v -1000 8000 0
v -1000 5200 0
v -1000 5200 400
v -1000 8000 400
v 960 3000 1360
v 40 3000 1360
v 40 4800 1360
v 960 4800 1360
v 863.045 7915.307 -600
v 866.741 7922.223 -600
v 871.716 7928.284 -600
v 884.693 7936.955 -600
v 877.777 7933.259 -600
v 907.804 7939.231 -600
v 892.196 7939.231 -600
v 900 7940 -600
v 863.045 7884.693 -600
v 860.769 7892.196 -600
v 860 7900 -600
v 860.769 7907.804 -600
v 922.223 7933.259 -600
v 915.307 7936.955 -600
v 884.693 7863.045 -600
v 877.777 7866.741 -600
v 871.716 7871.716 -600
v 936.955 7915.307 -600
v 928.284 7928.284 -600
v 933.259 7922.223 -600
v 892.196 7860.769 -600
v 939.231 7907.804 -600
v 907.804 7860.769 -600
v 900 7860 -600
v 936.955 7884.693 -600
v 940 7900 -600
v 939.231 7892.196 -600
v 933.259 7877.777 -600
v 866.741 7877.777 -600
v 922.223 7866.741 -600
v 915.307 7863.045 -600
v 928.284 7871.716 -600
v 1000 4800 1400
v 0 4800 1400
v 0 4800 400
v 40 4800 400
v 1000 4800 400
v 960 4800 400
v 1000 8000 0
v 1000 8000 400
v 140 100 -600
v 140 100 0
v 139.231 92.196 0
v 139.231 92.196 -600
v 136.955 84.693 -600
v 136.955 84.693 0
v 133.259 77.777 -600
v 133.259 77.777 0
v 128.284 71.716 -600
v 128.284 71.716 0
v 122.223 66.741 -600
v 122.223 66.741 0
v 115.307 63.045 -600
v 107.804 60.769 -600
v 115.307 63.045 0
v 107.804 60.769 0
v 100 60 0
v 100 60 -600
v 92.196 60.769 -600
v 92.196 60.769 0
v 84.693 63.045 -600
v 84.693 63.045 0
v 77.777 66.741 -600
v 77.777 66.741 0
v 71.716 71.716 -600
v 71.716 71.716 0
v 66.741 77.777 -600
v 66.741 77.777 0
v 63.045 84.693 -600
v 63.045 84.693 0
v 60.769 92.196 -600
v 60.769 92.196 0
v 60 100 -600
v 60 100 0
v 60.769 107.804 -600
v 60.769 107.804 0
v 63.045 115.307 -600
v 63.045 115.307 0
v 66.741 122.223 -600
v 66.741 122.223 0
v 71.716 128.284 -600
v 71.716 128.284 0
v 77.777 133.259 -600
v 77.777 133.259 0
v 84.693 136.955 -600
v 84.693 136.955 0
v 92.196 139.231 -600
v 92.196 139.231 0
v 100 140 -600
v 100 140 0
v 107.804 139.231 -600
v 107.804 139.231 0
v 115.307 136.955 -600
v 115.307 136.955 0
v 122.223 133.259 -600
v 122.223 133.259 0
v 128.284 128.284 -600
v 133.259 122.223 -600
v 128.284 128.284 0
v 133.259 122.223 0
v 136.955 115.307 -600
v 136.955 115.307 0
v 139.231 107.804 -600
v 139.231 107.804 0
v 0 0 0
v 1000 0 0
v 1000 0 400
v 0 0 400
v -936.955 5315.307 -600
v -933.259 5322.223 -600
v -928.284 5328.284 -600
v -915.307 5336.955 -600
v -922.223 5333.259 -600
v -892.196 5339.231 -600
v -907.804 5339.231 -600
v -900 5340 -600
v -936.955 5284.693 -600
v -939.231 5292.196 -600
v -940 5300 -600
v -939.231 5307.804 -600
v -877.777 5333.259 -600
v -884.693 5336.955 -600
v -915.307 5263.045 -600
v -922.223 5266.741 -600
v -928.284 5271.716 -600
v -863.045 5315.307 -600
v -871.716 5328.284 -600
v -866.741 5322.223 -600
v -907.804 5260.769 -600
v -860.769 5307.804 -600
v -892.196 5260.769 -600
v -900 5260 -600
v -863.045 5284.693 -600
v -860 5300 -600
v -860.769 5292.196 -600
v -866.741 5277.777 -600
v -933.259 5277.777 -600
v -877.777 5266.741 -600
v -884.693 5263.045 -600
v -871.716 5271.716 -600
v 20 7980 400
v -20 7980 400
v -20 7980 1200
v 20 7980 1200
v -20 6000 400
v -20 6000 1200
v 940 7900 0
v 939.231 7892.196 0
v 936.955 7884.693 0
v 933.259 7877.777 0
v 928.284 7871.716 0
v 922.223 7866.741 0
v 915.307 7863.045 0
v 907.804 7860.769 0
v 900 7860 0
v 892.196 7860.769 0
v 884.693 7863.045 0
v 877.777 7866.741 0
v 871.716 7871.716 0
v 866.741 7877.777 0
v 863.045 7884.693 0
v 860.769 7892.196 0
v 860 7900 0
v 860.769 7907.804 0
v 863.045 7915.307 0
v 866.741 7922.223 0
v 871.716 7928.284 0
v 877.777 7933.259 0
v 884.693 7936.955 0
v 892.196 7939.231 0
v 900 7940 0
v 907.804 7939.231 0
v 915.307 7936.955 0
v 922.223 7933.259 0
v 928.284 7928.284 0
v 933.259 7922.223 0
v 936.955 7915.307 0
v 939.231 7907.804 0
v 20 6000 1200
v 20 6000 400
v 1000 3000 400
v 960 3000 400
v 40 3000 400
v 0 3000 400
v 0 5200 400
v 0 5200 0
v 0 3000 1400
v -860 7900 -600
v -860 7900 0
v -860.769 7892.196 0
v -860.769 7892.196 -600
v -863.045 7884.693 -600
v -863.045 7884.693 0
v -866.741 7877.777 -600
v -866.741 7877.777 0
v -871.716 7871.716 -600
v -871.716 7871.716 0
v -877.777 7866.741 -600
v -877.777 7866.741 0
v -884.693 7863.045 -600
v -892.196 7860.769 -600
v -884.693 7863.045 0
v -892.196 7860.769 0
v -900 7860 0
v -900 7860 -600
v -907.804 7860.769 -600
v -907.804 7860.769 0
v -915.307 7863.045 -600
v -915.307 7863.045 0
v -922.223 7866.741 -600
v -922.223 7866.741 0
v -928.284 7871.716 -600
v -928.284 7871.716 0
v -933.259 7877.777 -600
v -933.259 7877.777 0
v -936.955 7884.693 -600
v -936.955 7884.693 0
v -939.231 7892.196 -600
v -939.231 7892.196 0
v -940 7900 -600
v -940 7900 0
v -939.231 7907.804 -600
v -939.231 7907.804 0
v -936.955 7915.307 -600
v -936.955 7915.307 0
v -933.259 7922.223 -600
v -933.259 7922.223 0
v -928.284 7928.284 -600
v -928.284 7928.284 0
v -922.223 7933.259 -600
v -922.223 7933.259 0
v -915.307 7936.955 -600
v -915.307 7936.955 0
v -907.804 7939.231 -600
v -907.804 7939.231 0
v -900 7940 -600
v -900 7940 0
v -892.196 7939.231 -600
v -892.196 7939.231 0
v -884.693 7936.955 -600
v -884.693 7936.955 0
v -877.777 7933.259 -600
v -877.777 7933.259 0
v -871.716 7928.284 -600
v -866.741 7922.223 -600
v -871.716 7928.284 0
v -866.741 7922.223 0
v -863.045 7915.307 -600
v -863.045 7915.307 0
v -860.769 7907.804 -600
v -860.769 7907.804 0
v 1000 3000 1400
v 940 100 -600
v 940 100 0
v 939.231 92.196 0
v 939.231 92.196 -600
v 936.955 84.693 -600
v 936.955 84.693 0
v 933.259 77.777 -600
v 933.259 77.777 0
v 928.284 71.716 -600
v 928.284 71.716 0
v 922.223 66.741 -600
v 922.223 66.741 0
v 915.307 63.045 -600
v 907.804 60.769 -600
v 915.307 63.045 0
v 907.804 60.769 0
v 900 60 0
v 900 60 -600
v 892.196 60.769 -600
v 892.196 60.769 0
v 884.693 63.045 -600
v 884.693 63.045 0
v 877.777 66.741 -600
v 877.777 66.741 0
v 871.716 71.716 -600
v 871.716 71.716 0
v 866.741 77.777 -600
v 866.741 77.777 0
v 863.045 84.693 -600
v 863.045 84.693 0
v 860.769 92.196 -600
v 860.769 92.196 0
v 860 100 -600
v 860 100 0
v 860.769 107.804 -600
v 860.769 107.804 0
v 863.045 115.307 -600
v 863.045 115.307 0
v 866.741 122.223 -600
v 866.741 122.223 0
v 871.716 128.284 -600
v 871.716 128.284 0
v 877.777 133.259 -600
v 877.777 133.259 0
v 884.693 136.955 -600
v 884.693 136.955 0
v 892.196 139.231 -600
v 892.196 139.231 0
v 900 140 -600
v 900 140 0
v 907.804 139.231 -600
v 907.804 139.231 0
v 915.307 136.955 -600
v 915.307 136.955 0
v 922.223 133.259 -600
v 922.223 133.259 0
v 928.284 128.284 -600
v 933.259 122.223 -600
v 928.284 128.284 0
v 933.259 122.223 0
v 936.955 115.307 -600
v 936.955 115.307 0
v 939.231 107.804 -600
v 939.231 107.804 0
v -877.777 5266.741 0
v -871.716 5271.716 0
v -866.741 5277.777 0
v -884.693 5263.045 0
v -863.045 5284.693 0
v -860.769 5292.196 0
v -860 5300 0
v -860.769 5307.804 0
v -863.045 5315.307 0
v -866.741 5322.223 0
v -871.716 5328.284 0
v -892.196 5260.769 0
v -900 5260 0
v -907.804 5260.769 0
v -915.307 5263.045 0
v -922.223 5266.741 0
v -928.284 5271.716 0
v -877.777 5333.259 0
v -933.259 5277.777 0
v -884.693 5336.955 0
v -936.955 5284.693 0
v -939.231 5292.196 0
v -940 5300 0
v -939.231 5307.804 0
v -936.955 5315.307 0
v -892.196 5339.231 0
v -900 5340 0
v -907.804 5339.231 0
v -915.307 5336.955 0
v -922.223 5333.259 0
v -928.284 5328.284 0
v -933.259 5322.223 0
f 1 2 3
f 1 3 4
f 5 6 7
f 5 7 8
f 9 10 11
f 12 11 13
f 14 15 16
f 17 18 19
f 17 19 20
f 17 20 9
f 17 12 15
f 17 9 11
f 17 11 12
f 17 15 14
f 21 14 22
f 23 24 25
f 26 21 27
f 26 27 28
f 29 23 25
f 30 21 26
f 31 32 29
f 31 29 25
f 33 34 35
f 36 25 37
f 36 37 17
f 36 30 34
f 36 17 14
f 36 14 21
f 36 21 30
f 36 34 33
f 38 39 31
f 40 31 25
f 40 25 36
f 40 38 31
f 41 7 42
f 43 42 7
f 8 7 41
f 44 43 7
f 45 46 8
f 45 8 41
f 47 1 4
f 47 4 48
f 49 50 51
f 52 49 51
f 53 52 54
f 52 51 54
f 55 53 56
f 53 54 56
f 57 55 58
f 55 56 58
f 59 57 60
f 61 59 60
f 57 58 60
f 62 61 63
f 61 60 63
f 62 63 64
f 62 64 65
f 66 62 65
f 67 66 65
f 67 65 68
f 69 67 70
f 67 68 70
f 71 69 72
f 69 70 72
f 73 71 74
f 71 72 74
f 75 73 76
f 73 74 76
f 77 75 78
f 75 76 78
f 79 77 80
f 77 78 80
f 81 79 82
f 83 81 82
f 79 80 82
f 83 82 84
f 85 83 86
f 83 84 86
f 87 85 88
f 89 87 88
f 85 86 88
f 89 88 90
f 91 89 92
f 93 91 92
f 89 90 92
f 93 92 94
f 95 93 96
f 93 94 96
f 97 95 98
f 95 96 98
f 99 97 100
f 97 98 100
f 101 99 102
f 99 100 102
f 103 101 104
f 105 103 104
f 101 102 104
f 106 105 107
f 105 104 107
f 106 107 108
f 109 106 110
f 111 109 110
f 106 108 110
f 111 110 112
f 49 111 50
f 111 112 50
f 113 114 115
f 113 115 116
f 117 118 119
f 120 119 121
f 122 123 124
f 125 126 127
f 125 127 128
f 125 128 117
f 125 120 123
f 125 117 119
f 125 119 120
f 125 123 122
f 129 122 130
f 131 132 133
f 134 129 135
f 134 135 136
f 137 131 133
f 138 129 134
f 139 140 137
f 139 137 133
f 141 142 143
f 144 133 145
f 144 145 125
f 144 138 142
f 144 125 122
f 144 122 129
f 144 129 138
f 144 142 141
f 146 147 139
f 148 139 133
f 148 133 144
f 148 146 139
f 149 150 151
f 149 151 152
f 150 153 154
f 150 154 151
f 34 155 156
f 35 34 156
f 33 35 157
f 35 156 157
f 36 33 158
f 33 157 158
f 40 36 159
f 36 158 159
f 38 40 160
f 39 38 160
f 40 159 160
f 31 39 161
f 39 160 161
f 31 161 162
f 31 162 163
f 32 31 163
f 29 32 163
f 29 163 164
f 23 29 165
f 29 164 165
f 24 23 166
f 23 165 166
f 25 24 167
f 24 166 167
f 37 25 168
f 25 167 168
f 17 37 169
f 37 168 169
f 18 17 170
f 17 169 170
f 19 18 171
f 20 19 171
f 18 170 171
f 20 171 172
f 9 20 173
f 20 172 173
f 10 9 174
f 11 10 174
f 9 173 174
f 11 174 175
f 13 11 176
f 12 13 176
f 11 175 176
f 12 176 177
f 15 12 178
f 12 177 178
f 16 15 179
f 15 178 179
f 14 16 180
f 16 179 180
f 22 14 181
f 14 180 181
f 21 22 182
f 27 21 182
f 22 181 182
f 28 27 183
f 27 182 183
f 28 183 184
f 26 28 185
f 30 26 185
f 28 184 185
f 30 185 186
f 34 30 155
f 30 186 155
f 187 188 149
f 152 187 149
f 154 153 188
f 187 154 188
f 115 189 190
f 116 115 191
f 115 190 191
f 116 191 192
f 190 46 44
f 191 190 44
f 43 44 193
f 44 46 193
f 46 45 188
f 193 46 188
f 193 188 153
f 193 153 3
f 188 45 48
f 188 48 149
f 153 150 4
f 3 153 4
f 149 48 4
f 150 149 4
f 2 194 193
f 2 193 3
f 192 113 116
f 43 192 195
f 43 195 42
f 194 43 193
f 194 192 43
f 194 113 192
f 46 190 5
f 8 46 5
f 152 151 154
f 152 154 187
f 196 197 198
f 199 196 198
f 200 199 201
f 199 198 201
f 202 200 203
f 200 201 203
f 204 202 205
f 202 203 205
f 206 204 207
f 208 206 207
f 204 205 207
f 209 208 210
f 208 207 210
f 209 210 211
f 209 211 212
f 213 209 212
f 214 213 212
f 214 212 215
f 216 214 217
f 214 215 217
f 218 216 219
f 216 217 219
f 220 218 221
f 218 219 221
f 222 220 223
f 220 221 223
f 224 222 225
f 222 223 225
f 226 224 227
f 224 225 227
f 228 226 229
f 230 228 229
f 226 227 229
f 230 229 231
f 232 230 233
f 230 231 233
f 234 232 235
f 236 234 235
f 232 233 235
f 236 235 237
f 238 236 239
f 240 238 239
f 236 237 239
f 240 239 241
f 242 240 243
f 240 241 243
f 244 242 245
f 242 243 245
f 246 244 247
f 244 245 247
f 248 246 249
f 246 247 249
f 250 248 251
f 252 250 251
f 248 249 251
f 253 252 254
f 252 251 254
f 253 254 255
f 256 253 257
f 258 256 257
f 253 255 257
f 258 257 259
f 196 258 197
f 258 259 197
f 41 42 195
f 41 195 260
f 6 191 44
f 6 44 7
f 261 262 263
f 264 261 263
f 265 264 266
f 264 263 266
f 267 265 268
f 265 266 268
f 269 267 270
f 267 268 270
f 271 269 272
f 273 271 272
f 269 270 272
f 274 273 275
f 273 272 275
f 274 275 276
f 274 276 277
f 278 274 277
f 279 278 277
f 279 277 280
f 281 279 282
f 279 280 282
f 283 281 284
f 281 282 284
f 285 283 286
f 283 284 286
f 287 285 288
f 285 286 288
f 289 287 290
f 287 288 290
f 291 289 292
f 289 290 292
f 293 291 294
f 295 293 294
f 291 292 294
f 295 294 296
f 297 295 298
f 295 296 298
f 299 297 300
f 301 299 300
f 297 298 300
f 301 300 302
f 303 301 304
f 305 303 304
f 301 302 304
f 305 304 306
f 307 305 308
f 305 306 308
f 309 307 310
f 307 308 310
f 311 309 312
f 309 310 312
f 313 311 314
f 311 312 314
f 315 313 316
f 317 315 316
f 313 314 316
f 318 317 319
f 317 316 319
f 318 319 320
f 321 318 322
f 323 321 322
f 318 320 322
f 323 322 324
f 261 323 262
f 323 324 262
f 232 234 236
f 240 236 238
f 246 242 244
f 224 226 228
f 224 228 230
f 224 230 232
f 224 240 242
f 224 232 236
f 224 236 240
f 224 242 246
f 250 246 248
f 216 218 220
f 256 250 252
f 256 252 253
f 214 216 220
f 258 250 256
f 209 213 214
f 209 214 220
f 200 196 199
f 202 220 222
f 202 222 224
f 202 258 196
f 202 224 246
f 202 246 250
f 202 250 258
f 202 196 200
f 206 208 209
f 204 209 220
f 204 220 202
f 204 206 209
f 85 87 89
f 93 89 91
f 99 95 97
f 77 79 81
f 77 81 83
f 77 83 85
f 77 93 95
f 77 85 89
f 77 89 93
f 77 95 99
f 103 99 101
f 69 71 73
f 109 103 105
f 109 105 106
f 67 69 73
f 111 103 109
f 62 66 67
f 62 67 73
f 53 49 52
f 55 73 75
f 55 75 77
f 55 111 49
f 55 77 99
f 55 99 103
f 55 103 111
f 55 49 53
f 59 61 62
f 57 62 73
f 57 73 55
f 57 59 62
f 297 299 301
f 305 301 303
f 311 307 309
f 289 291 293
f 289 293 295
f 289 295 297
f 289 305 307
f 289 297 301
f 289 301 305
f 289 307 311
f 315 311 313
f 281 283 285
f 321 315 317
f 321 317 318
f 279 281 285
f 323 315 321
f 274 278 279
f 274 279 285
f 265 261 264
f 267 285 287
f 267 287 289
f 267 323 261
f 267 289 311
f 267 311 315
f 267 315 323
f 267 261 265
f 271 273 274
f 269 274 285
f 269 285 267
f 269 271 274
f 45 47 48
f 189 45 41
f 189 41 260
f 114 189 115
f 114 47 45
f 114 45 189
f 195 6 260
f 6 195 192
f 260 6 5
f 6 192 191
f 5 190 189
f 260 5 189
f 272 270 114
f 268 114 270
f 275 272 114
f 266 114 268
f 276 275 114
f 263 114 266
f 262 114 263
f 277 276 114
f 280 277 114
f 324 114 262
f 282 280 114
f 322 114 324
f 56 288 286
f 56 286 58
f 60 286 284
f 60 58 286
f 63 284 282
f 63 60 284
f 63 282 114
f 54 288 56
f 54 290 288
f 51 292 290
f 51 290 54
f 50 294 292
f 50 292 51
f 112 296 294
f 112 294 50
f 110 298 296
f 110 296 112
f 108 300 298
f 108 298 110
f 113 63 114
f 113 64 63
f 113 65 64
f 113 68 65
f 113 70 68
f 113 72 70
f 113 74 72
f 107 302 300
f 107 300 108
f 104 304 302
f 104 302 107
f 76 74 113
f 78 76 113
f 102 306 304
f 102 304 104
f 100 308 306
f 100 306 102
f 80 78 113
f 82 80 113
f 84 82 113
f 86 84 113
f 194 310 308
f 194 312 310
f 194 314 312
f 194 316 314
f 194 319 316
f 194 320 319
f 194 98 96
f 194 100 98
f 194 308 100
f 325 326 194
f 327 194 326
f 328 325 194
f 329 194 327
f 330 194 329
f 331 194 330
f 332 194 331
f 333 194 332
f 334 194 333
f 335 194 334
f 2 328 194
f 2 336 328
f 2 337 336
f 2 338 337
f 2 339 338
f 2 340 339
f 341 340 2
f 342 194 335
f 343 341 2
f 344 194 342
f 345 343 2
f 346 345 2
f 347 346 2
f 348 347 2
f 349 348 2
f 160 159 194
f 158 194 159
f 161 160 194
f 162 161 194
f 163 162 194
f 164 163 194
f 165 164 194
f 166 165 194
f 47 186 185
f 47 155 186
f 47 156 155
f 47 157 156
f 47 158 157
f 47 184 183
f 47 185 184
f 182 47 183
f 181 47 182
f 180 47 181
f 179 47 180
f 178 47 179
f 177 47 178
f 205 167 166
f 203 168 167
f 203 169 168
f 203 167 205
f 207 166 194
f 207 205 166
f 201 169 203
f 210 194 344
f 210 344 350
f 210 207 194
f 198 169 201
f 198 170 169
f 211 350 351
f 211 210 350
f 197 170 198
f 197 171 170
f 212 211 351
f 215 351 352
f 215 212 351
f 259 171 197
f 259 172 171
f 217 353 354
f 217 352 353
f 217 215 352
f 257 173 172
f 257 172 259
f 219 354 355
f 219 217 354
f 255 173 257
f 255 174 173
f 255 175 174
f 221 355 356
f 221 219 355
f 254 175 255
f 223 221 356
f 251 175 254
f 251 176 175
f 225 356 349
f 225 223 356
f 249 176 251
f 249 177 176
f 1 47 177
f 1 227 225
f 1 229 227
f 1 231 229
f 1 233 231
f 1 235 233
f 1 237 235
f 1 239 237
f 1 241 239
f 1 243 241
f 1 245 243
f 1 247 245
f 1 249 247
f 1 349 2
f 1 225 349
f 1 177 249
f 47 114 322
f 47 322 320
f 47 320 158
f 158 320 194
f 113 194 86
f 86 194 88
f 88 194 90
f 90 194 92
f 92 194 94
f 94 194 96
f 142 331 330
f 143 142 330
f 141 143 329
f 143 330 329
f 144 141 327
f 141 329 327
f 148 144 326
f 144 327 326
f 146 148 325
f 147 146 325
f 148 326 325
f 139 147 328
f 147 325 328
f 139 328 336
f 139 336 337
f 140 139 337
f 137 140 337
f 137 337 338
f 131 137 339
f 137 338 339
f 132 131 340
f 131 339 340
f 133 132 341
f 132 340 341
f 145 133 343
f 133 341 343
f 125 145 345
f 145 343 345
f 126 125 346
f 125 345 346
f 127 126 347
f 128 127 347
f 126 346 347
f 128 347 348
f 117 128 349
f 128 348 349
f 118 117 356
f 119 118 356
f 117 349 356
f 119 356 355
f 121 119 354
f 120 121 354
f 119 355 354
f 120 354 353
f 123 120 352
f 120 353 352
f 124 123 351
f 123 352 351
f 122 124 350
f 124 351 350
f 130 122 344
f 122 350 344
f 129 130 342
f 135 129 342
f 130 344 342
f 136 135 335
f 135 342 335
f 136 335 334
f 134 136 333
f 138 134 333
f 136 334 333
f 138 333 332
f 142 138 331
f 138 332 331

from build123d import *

# Parameters (mm, degrees)
PAD_DEPTH    = 400
SKETCH001_R  = 40
PAD001_DEPTH = 600
SKETCH002_W  = 1000
SKETCH002_H  = 1800
PAD002_DEPTH = 1000
SKETCH003_W  = 920
SKETCH003_H  = 960
POCKET_DEPTH = 1800
SKETCH004_W  = 40
SKETCH004_H  = 1980
PAD003_DEPTH = 800


with BuildPart() as part:
    # Sketch → Pad (new body)
    with BuildSketch(Plane.XY):
        Polygon((-1000, 8000), (1000, 8000), (1000, 0), (0, 0), (0, 5200), (-1000, 5200), align=None)
    extrude(amount=PAD_DEPTH)

    # Sketch001 (on Face7 of Pad) → Pad001 (join)
    with BuildSketch(Plane(origin=(0, 0, 0), x_dir=(1, 0, 0), z_dir=(0, 0, -1))):
        with Locations((100, -100)):
            Circle(SKETCH001_R)
        with Locations((900, -100)):
            Circle(SKETCH001_R)
        with Locations((-900, -5300)):
            Circle(SKETCH001_R)
        with Locations((-900, -7900)):
            Circle(SKETCH001_R)
        with Locations((900, -7900)):
            Circle(SKETCH001_R)
    extrude(amount=PAD001_DEPTH)

    # Sketch002 (on Face5 of Pad001) → Pad002 (join)
    with BuildSketch(Plane.XY.offset(400)):
        with Locations((500, 3900)):
            Rectangle(SKETCH002_W, SKETCH002_H)
    extrude(amount=PAD002_DEPTH)

    # Sketch003 (on Face17 of Pad002) → Pocket (cut)
    with BuildSketch(Plane.XZ.offset(-3000)):
        with Locations((500, 880)):
            Rectangle(SKETCH003_W, SKETCH003_H)
    extrude(amount=-POCKET_DEPTH, mode=Mode.SUBTRACT)

    # Sketch004 (on Face4 of Pocket) → Pad003 (join)
    with BuildSketch(Plane.XY.offset(400)):
        with Locations((0, 6990)):
            Rectangle(SKETCH004_W, SKETCH004_H)
    extrude(amount=PAD003_DEPTH)


solid = part.part
